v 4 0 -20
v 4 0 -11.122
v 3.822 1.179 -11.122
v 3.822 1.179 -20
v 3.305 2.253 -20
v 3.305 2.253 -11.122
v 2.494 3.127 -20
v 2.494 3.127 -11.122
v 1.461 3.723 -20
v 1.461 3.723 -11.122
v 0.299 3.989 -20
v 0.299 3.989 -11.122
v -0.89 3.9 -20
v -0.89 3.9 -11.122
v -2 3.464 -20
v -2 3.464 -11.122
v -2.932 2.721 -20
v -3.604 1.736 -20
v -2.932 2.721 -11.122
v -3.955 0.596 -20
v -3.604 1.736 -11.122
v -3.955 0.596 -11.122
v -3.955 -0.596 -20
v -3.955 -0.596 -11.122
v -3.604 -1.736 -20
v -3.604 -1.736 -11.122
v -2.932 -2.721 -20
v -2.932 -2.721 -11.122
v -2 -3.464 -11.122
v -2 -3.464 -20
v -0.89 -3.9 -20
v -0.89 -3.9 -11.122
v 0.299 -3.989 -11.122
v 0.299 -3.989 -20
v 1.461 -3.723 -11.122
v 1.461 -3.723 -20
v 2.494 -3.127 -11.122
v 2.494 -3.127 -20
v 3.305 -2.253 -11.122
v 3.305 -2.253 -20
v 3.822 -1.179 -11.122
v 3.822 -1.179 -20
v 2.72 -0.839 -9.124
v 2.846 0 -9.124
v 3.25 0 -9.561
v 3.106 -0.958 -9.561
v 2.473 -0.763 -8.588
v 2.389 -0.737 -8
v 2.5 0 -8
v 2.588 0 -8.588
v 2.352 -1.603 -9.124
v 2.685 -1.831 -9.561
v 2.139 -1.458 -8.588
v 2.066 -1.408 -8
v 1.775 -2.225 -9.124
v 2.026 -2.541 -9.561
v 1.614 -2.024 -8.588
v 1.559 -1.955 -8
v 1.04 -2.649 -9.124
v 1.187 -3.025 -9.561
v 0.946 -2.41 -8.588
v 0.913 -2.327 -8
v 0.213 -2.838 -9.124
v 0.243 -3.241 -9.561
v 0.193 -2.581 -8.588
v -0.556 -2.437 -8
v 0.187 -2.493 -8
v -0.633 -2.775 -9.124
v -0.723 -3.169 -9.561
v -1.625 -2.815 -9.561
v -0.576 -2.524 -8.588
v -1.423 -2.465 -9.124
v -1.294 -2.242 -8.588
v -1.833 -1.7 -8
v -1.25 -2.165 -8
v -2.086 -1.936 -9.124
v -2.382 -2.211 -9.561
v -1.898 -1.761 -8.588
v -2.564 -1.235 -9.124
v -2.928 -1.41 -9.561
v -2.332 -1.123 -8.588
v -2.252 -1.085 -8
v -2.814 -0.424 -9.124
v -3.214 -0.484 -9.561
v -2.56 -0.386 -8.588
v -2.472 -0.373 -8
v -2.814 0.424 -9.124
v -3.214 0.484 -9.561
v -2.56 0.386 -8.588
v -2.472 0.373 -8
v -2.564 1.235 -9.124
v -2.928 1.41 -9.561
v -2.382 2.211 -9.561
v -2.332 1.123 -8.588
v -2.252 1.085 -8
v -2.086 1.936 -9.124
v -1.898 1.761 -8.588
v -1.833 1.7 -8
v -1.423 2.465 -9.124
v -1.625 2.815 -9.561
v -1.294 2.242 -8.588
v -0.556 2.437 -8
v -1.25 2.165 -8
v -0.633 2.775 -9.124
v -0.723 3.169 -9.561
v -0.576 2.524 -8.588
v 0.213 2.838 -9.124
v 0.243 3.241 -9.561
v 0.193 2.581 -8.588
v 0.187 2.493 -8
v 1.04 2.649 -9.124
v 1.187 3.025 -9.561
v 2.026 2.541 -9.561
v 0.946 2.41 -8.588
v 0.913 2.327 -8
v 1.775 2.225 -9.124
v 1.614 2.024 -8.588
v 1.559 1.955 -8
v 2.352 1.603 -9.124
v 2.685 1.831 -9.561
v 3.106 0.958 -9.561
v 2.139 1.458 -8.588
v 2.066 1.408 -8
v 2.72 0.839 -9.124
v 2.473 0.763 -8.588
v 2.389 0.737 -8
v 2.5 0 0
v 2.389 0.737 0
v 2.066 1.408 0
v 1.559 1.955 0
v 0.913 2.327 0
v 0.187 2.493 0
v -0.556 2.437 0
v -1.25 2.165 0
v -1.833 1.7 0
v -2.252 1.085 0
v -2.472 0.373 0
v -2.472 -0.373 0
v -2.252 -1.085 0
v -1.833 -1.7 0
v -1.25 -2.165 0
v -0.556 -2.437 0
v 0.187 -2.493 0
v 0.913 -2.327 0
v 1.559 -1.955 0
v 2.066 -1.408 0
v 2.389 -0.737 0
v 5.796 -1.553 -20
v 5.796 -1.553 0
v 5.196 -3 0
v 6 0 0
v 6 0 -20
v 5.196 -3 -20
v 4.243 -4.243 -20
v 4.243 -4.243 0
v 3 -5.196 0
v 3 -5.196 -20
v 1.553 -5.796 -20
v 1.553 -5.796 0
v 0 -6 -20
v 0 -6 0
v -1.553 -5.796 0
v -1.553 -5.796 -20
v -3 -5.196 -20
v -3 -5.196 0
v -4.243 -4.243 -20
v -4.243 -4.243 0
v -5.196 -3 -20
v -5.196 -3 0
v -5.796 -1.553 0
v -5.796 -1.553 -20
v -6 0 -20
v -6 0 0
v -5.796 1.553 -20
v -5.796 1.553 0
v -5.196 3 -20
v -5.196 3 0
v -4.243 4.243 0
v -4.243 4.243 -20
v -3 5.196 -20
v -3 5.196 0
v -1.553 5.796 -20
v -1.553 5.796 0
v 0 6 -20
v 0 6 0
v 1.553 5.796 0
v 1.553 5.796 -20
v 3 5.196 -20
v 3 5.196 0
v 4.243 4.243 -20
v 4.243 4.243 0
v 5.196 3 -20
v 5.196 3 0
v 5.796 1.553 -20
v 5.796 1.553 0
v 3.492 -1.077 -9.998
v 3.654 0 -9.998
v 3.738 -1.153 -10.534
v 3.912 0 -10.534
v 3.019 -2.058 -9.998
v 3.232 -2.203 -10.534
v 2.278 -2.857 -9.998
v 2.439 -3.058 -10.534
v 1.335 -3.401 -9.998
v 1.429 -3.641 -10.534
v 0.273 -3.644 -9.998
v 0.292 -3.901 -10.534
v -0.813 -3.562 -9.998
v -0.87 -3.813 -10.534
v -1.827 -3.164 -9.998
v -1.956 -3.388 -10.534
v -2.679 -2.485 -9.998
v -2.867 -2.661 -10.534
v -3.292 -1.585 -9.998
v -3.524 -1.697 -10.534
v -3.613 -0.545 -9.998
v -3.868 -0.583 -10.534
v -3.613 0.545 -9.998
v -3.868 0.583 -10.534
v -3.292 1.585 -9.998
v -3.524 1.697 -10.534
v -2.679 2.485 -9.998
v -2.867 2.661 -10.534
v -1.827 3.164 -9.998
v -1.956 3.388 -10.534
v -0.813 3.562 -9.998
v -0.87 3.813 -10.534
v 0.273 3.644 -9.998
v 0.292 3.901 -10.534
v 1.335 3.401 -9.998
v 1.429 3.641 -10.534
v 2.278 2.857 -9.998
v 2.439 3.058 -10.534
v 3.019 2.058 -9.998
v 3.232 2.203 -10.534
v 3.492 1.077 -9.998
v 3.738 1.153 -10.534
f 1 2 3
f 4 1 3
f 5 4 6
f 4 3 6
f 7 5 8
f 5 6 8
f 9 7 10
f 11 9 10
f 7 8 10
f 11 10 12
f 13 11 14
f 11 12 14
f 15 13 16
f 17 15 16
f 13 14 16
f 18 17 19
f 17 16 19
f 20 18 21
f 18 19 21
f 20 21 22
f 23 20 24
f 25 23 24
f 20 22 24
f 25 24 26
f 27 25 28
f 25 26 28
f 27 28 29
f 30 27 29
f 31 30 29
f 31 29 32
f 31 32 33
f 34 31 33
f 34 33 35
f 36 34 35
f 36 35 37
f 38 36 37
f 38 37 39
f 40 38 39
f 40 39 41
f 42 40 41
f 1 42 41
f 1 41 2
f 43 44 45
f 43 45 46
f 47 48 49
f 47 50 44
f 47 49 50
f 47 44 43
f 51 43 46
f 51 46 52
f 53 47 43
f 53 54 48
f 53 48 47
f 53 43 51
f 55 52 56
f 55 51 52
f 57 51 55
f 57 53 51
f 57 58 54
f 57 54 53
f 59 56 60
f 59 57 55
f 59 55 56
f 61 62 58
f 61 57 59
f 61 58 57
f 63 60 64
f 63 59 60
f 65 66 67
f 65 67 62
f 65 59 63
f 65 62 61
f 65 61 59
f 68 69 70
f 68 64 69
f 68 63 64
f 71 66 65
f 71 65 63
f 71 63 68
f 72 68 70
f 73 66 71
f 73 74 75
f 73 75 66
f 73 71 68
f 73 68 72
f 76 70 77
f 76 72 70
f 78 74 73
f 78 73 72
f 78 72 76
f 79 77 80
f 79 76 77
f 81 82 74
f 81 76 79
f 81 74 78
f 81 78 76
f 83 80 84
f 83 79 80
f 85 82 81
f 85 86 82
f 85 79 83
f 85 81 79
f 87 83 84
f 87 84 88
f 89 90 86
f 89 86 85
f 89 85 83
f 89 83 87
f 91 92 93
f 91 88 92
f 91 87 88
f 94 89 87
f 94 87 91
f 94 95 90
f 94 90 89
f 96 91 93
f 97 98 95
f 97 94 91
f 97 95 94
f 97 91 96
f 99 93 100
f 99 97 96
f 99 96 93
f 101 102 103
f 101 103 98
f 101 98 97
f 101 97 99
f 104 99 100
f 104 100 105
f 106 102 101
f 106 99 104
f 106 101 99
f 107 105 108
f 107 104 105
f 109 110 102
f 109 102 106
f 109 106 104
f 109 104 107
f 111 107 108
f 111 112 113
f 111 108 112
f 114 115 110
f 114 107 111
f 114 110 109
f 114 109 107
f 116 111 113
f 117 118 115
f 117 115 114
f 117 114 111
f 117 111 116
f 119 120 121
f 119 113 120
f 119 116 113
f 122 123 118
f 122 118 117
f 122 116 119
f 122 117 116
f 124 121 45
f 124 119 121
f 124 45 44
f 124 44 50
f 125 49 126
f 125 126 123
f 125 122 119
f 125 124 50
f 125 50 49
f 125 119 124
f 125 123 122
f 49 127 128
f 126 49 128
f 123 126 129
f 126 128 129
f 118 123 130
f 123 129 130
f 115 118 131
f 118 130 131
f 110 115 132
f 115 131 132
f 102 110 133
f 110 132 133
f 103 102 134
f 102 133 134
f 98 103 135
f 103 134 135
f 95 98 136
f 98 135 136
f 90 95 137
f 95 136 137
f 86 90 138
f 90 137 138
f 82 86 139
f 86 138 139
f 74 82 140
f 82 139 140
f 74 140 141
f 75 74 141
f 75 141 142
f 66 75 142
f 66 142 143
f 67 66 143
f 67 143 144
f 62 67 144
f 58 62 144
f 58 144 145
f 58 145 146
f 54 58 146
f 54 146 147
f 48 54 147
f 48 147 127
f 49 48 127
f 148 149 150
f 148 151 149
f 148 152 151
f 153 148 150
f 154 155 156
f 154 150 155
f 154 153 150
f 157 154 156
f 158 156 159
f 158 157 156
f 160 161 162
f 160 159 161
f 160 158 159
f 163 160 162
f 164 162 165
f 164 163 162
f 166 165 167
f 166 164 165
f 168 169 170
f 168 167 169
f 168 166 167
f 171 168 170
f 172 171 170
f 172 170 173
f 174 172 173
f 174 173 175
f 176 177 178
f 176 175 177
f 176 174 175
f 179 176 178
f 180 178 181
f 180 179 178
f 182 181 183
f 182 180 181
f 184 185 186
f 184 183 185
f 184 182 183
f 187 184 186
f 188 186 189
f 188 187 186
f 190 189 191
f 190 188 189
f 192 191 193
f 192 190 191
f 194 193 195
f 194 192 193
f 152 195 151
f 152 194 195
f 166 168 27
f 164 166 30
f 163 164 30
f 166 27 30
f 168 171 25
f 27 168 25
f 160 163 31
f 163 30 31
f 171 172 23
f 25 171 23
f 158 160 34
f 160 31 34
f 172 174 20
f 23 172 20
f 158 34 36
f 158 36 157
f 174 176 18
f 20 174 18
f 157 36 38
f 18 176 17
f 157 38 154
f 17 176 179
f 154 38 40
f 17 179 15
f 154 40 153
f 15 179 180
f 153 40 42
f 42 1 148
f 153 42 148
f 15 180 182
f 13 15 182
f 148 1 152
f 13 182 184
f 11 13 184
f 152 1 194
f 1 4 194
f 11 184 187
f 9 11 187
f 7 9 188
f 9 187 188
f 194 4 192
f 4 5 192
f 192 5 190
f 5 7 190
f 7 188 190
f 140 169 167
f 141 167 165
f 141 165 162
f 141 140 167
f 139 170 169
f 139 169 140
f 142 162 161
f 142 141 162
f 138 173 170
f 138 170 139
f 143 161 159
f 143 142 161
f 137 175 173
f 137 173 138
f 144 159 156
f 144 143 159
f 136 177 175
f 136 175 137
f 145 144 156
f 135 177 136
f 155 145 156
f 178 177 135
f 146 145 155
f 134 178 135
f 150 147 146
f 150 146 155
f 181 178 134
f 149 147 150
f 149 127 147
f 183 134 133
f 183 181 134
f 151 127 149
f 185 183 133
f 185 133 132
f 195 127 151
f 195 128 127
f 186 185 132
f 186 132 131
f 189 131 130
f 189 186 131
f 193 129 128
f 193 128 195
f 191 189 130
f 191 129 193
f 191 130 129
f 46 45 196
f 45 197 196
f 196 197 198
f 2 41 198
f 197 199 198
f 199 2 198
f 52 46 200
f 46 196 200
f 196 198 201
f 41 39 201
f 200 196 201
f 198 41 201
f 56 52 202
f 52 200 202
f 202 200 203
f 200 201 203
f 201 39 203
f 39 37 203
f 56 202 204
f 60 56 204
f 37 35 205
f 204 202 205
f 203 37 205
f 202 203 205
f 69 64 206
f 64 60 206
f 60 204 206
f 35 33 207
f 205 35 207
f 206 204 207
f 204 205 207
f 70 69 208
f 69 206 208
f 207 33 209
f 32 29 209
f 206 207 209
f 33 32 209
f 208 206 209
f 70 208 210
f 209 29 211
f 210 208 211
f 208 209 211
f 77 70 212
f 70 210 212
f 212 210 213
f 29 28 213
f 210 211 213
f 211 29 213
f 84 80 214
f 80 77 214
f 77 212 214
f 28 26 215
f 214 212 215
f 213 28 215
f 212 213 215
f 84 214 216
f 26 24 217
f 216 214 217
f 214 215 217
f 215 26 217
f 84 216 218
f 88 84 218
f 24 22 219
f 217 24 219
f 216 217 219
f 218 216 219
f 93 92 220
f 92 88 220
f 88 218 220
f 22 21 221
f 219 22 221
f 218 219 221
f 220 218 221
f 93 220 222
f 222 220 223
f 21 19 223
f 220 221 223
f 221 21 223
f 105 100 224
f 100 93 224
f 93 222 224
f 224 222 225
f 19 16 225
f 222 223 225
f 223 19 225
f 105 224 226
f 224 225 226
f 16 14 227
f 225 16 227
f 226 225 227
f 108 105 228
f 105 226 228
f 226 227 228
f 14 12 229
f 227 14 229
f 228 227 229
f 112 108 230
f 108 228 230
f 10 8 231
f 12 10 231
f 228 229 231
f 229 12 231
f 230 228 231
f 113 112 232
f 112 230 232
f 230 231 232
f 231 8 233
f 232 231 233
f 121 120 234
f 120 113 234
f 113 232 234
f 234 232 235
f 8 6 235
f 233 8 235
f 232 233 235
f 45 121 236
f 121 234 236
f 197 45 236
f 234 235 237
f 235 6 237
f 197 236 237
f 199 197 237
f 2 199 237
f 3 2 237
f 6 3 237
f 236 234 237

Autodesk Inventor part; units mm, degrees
ref_plane "YZ Plane" through (0, 0, 0) normal (1, 0, 0) x (0, 1, 0)
ref_plane "XZ Plane" through (0, 0, 0) normal (0, 1, 0) x (-1, 0, 0)
ref_plane "XY Plane" through (0, 0, 0) normal (0, 0, 1) x (1, 0, 0)
sketch "Sketch1" plane through (0, 0, 0) normal (0, 1, 0) x (-1, 0, 0)
  line L0 (0, 0) -> (-6, 0)
  line L1 (-6, 0) -> (-6, -20)
  line L2 (-6, -20) -> (0, -20)
  line L3 (0, -20) -> (0, 0)
  line L4 (0, 0) -> (-2.5, 0)
  line L5 (0, -10) -> (-2.5, -10)
  line L6 (-2.5, -8) -> (-2.5, 0)
  line L7 (0, -20) -> (-4, -20)
  line L8 (-4, -20) -> (-4, -11.1225)
  line L9 (-4, -10) -> (-4.5, -10)
  arc A0 (-3.25, -9.5612) -> (-2.5, -8) centre (-4.5, -8) ccw
  arc A1 (-3.25, -9.5612) -> (-4, -11.1225) centre (-2, -11.1225) ccw
  dimension "d0" = 6
  dimension "d1" = 20
  dimension "d2" = 2.5
  dimension "d3" = 4
  dimension "d4" = 2
revolve "Revolution1" add sketch "Sketch1" angle 360 about axis through (0, 0, -20) along (0, 0, 1) contours L6 A0 A1 L8 L2 L1 L0
ref_plane "Work Plane1" through (0, 0, -10) normal (0, 0, 1) x (1, 0, 0)
properties part number "motorCoupling5_8"
